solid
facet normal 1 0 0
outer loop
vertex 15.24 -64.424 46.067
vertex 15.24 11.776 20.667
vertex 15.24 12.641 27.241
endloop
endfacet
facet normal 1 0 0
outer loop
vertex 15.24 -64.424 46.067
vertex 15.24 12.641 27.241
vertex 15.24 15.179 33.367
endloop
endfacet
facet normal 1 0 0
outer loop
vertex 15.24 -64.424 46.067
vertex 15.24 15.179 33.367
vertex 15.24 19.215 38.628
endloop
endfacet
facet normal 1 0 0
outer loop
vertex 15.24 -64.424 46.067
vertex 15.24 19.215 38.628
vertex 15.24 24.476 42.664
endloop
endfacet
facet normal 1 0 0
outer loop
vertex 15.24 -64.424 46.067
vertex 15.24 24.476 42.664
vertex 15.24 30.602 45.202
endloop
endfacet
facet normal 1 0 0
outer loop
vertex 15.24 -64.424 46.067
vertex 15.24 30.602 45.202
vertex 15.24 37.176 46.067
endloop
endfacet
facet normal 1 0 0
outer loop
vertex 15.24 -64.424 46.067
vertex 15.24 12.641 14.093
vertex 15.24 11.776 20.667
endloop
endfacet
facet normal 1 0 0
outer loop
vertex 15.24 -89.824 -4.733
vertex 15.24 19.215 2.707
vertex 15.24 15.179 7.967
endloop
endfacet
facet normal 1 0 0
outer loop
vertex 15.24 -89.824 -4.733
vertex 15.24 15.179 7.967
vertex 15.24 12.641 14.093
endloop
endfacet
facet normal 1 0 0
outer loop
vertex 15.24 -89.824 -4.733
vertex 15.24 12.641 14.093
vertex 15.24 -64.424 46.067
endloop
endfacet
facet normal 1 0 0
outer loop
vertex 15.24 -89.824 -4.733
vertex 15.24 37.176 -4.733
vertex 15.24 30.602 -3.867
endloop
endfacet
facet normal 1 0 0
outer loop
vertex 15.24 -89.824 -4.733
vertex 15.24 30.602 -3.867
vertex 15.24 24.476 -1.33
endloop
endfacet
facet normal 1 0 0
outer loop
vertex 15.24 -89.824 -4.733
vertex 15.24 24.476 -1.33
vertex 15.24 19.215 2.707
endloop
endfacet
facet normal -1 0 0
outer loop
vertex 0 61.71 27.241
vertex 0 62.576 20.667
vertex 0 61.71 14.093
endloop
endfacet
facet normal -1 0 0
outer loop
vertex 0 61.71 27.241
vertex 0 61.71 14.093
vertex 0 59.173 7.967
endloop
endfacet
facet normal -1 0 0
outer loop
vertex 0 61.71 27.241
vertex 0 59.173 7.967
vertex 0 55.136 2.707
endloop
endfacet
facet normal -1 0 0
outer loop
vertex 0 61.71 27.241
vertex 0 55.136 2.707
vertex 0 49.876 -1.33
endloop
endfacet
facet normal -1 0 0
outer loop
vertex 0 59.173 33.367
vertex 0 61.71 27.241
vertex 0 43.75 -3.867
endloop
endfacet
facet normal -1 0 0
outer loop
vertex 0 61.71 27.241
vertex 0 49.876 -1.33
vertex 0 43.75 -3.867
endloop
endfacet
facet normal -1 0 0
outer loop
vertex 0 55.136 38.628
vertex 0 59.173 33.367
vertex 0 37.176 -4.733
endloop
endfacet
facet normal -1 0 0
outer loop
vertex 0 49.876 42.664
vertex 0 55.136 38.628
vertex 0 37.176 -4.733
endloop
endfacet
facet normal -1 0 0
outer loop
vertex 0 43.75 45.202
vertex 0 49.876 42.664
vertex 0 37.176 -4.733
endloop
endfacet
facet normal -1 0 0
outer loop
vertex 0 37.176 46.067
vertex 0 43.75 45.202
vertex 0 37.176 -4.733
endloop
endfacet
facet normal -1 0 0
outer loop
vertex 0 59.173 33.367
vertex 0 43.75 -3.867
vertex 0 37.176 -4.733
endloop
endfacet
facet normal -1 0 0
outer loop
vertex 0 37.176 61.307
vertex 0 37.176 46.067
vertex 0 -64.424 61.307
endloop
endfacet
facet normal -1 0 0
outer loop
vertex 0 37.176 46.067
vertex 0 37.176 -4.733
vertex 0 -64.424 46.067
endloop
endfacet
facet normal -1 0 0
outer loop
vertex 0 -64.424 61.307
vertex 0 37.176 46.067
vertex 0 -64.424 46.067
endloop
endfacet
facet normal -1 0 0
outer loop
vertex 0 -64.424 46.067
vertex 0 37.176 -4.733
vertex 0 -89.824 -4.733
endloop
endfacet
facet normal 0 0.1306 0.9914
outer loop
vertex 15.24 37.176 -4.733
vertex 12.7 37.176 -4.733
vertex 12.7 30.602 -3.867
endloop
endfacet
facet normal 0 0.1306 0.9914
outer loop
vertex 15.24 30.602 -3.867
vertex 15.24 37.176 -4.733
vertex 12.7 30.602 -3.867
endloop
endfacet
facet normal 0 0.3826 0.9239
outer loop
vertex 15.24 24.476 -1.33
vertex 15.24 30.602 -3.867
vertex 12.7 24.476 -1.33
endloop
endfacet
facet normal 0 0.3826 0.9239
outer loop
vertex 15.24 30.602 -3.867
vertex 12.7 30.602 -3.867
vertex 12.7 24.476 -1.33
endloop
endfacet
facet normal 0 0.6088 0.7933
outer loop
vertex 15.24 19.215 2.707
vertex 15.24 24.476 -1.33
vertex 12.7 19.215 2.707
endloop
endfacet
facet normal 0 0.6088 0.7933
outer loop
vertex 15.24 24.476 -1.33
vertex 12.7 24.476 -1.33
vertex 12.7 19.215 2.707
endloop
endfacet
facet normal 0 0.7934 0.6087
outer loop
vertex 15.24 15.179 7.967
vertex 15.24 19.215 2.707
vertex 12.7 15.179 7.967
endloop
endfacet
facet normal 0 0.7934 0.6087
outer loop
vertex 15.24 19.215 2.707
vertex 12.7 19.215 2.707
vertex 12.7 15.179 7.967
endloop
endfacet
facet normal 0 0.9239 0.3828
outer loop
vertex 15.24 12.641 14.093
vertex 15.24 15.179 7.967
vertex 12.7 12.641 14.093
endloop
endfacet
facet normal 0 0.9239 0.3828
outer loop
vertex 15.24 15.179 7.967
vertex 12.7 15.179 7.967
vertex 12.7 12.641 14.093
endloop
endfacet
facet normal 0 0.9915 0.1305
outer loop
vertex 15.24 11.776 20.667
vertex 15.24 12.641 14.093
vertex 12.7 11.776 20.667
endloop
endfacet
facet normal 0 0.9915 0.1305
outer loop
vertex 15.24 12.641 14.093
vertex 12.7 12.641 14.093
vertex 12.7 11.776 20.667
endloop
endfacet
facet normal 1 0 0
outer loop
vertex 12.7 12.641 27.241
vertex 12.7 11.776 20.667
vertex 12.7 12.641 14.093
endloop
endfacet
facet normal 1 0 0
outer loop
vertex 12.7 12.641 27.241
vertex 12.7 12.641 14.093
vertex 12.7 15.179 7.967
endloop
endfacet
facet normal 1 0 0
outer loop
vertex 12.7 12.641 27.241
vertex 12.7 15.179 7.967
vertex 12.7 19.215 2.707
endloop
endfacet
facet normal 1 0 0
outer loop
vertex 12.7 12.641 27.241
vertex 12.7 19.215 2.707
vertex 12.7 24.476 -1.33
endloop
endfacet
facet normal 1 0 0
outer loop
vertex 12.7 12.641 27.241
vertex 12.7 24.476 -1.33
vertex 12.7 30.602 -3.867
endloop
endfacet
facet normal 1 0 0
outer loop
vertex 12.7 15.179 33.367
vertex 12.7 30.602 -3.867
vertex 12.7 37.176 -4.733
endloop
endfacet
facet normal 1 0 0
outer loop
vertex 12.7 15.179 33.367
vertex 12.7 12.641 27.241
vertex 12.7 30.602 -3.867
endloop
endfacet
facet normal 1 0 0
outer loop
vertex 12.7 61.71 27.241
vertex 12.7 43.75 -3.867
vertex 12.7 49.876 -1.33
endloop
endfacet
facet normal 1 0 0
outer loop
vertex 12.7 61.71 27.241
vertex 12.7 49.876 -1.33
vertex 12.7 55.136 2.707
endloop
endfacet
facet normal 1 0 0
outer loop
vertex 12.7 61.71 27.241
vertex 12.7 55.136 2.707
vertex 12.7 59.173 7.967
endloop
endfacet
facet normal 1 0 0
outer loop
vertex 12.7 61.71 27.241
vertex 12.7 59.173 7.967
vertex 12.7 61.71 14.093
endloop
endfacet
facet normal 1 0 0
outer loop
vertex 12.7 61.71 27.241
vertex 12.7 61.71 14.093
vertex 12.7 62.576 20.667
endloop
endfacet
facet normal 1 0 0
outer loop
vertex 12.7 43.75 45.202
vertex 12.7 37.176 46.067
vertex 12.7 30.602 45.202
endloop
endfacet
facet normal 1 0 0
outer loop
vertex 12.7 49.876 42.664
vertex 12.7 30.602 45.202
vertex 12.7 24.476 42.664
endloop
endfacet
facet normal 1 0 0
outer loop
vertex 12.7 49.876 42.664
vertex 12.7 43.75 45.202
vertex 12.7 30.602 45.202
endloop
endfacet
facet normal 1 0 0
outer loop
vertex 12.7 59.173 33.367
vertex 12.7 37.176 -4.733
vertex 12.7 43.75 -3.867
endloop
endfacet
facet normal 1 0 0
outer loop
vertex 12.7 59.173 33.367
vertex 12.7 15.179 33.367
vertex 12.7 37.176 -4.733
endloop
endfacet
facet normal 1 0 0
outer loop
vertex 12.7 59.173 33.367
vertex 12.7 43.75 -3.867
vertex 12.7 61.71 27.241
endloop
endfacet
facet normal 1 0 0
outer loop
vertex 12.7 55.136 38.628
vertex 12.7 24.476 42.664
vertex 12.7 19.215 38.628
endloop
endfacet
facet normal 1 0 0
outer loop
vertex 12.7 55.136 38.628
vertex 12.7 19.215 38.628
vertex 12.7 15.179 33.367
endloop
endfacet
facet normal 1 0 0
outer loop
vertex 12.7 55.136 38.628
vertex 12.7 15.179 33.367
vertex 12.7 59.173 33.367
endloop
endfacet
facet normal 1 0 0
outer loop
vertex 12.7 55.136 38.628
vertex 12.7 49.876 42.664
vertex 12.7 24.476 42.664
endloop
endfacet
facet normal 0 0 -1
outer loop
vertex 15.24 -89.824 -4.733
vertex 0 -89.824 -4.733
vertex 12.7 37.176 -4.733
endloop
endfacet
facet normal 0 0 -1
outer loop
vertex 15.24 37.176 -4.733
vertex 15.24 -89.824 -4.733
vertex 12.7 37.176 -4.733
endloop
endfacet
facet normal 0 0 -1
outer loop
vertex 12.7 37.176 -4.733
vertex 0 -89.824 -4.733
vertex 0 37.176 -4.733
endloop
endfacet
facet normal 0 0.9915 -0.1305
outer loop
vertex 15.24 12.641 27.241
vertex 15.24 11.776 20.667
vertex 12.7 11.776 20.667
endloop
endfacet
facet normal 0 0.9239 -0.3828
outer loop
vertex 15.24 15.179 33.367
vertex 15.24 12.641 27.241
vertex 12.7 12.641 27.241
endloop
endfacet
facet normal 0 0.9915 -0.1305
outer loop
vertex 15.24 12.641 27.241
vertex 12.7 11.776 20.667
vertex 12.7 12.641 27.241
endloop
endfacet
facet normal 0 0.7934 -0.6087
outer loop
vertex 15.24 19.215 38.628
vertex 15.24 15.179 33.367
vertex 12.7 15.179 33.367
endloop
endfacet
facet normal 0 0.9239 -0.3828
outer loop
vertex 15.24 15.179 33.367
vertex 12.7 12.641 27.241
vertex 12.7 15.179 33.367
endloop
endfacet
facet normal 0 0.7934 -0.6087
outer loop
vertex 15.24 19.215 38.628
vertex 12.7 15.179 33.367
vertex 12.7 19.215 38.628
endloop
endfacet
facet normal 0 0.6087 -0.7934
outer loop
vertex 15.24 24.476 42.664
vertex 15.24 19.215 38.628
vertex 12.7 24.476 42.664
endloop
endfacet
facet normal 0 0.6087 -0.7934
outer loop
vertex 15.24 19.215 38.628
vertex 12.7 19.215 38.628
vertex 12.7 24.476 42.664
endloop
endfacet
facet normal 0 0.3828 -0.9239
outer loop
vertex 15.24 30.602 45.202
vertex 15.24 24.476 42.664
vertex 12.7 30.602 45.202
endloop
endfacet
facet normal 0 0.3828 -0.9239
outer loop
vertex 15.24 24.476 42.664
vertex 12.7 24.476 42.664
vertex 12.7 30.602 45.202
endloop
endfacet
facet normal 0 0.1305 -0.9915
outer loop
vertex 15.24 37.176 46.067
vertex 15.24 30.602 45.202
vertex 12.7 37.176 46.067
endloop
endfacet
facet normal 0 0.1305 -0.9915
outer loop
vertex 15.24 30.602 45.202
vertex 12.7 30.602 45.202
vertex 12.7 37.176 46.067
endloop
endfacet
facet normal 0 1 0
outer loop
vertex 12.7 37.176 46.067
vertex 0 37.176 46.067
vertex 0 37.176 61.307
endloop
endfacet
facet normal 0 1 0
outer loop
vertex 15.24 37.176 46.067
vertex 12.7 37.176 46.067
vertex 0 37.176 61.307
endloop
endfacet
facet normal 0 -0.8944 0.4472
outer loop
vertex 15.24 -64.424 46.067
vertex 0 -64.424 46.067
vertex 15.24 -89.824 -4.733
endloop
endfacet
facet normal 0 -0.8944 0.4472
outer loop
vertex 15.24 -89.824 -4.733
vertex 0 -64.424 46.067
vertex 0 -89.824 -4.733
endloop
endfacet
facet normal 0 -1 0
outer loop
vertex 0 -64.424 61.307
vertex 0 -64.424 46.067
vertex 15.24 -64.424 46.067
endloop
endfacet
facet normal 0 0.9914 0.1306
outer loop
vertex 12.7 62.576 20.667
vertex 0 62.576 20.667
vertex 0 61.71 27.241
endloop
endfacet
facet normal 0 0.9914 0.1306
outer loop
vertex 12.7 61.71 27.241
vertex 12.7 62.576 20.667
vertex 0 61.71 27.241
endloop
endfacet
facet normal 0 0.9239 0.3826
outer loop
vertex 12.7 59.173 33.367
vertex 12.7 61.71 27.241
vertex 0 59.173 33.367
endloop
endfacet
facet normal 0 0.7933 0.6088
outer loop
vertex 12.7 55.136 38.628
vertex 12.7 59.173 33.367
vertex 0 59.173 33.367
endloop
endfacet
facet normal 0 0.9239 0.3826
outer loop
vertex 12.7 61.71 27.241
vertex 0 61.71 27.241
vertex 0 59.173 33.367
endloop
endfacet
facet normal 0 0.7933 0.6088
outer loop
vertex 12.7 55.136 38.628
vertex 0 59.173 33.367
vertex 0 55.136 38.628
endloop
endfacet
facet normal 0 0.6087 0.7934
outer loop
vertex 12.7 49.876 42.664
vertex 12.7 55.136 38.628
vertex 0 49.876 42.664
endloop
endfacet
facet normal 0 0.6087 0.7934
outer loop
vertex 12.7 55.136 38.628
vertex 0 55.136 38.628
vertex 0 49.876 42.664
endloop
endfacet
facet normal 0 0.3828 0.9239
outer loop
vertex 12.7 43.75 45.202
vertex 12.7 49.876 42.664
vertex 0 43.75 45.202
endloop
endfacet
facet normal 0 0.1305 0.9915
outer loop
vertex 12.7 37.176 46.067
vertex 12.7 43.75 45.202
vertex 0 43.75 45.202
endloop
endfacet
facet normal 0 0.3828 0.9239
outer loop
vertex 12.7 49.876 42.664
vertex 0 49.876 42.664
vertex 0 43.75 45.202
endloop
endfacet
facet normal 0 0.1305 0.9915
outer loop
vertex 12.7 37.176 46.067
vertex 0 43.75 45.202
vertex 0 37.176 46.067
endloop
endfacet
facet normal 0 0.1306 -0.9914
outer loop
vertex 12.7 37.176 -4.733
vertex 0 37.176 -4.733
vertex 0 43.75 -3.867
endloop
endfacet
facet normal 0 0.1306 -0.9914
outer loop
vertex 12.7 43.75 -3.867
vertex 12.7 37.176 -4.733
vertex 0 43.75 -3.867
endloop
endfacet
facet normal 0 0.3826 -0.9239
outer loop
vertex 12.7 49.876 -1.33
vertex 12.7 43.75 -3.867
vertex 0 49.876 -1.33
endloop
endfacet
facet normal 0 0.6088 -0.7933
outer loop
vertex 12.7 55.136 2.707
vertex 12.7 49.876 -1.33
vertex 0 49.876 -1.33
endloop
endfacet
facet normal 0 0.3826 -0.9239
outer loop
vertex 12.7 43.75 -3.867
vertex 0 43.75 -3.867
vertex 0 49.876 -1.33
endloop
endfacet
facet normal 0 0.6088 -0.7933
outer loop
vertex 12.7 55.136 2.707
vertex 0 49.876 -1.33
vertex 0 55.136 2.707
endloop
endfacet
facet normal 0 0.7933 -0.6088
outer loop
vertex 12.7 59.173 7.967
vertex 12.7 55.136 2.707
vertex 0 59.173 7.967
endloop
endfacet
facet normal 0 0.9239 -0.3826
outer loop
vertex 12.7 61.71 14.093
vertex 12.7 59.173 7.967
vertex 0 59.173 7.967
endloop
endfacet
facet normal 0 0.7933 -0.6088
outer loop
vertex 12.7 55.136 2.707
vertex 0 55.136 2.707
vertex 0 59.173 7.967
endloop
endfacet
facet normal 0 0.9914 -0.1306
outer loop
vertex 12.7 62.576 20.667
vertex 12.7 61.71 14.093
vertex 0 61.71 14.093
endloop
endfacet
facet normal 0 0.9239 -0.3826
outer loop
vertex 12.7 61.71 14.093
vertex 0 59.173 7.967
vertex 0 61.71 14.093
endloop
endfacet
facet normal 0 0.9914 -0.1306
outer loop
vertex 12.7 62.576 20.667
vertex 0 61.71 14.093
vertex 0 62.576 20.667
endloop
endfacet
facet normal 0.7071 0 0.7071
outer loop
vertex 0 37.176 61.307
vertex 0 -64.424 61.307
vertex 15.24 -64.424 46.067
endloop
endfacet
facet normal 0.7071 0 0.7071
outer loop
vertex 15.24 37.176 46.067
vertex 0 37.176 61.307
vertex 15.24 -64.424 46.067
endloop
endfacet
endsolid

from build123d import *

# Parameters (mm, degrees)
F1_DEPTH = 15.24
F2_DEPTH = 12.7
F3_DEPTH = 15.24
F5_DEPTH = 101.6


# Not quite as in the source:
# - a feature names something its author has since deleted; it is built from what else it names


with BuildPart() as f1:
    # F0 (on Right) → F1 (new body)
    with BuildSketch(Plane.YZ):
        with BuildLine():
            ThreePointArc((37.1756509936, -4.7328671039), (19.2151387515, 2.7066206539), (11.7756509936, 20.6671328961))
            Line((11.7756509936, 20.6671328961), (-77.1243490064, 20.6671328961))
            Line((-77.1243490064, 20.6671328961), (-89.8243490064, -4.7328671039))
            Line((-89.8243490064, -4.7328671039), (37.1756509936, -4.7328671039))
        make_face()
        with BuildLine():
            Line((-77.1243490064, 20.6671328961), (11.7756509936, 20.6671328961))
            ThreePointArc((11.7756509936, 20.6671328961), (19.2151387515, 38.6276451382), (37.1756509936, 46.0671328961))
            Line((37.1756509936, 46.0671328961), (-64.4243490064, 46.0671328961))
            Line((-64.4243490064, 46.0671328961), (-77.1243490064, 20.6671328961))
        make_face()
    extrude(amount=F1_DEPTH)

    # F0 (on Right) → F2 (join)
    with BuildSketch(Plane.YZ):
        with BuildLine():
            Line((11.7756509936, 20.6671328961), (62.5756509936, 20.6671328961))
            ThreePointArc((62.5756509936, 20.6671328961), (55.1361632357, 38.6276451382), (37.1756509936, 46.0671328961))
            ThreePointArc((37.1756509936, 46.0671328961), (19.2151387515, 38.6276451382), (11.7756509936, 20.6671328961))
        make_face()
        with BuildLine():
            ThreePointArc((37.1756509936, -4.7328671039), (55.1361632357, 2.7066206539), (62.5756509936, 20.6671328961))
            Line((62.5756509936, 20.6671328961), (11.7756509936, 20.6671328961))
            ThreePointArc((11.7756509936, 20.6671328961), (19.2151387515, 2.7066206539), (37.1756509936, -4.7328671039))
        make_face()
    extrude(amount=F2_DEPTH)

    # F3 (add): a face of the model
    f3_faces = [f1.faces().sort_by_distance(p)[0] for p in [
        (7.62, -13.6243490064, 46.0671328961),
    ]]
    extrude(f3_faces, amount=F3_DEPTH)

    # F4 (on face) → F5 (cut)
    with BuildSketch(Plane.XZ.offset(64.4243490064)):
        Polygon((15.24, 61.3071328961), (0, 61.3071328961), (15.24, 46.0671328961), align=None)
    extrude(amount=-F5_DEPTH, mode=Mode.SUBTRACT)


solid = f1.part
